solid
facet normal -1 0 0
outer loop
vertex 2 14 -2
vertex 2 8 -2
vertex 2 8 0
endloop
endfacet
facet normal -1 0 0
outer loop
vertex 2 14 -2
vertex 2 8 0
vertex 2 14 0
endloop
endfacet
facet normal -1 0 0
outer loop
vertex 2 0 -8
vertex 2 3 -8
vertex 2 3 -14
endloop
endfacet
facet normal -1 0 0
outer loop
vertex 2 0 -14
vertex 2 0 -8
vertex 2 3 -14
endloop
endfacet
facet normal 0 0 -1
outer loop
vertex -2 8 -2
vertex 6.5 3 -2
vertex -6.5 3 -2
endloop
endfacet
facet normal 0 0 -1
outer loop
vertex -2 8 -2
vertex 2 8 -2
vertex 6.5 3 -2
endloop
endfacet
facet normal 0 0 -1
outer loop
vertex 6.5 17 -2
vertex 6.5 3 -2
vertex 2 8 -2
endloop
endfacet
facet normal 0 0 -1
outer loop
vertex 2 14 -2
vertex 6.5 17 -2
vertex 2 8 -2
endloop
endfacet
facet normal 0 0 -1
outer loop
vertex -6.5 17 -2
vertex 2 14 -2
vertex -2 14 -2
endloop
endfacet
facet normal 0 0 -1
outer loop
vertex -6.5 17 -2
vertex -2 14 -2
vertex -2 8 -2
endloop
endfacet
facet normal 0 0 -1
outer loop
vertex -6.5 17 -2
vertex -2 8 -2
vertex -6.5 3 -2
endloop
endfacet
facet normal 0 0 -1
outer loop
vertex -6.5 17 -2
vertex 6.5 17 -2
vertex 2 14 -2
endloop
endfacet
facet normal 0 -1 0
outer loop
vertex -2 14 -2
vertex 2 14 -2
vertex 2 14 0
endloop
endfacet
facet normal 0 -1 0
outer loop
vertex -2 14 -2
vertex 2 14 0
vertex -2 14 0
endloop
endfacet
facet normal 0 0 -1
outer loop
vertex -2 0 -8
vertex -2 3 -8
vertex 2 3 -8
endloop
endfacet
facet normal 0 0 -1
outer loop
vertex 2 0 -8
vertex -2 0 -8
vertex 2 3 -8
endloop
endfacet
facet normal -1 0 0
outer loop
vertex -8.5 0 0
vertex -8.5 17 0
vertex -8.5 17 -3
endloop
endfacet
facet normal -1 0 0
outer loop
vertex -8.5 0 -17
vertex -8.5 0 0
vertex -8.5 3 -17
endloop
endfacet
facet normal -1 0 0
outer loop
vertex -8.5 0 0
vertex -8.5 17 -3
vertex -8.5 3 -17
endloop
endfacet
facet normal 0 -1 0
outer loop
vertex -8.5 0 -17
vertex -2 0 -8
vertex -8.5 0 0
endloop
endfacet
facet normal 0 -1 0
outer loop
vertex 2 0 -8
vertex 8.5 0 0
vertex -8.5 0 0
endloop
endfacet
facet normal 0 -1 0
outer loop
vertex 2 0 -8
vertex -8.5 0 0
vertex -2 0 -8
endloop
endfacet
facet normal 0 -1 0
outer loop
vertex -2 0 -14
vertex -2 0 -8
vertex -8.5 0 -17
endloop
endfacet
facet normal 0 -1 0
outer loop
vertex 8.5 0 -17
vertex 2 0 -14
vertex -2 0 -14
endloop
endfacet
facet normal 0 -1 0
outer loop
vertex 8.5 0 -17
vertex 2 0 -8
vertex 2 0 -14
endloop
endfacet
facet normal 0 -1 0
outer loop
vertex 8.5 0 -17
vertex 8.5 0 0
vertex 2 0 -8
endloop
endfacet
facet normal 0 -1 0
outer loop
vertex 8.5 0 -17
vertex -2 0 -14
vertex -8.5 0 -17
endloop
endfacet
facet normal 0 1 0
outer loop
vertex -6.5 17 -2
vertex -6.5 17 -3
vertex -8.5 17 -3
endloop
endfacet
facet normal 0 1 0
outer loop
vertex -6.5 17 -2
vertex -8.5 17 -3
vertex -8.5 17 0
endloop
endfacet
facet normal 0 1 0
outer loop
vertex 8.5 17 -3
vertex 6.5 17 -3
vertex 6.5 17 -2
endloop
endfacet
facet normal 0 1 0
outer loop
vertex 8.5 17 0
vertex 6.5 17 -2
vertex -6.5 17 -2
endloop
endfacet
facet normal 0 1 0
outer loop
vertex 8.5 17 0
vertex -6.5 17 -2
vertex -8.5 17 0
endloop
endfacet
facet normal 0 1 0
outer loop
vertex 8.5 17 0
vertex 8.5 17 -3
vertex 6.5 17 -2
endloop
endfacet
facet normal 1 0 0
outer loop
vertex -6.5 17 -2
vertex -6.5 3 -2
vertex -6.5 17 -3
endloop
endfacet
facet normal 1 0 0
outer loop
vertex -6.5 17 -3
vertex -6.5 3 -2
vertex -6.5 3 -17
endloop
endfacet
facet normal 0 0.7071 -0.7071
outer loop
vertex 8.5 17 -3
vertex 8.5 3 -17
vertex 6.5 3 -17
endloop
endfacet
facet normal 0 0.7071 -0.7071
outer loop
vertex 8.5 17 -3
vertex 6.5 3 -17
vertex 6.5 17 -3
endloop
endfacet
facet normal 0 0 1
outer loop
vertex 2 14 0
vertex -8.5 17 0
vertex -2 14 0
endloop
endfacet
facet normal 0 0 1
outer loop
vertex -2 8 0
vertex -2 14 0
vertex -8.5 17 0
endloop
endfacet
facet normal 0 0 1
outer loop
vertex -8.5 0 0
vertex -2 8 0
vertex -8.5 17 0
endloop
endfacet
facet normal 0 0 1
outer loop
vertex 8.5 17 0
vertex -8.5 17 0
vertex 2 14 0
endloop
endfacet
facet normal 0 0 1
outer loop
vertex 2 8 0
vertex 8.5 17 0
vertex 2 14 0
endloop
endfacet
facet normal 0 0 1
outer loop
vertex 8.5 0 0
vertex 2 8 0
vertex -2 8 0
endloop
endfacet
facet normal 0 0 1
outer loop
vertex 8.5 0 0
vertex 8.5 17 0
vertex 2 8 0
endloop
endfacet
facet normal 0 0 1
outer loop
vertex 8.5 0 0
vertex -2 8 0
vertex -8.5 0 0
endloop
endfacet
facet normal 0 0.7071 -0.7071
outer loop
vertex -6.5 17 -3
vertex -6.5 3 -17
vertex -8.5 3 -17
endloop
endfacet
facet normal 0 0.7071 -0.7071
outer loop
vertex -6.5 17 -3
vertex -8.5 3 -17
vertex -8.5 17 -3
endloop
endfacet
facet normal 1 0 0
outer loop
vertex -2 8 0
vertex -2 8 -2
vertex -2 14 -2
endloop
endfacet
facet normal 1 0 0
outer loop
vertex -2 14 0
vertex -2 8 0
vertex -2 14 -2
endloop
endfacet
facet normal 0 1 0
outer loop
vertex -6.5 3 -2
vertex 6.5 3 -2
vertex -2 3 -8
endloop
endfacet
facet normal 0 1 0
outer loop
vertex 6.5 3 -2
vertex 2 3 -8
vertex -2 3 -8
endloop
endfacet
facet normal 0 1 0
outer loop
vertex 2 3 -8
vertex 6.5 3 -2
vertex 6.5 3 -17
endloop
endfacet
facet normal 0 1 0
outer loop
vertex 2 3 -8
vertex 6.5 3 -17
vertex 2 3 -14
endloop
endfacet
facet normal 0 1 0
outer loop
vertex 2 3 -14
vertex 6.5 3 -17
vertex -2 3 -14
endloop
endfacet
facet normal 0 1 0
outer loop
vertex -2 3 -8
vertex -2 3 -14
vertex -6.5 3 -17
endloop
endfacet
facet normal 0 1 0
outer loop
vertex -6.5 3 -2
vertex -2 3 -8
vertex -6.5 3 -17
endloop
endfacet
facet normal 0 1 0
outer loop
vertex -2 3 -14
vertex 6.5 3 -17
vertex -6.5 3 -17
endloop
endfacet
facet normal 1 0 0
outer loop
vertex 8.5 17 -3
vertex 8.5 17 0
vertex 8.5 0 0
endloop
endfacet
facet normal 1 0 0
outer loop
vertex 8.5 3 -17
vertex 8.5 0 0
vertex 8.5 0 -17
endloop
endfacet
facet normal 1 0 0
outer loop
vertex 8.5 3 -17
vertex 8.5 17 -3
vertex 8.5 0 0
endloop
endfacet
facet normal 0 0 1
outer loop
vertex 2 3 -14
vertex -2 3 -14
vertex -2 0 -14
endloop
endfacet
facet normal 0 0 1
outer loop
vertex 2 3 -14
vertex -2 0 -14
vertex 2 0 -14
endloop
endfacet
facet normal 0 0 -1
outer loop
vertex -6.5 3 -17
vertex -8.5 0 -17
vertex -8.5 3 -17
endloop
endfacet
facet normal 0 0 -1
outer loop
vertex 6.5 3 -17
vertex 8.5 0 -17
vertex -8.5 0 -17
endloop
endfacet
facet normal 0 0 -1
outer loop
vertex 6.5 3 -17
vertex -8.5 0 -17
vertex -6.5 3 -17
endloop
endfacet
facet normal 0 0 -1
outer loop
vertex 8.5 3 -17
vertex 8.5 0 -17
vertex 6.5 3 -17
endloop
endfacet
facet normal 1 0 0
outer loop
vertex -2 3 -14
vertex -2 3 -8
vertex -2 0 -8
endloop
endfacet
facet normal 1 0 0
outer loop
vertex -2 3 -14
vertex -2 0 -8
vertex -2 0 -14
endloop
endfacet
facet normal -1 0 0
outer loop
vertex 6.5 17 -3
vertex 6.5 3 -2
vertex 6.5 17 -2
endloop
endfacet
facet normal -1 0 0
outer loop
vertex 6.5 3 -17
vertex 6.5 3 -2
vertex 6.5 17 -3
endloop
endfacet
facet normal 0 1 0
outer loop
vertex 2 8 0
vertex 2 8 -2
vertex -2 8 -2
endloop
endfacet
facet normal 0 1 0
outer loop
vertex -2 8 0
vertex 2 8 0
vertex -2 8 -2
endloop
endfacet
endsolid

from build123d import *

# Parameters (mm, degrees)
BODY_DEPTH     = 8.5
SKETCH2_W      = 13
SKETCH2_H      = 14
EXTUSION_DEPTH = 15
SKETCH3_W      = 4
SKETCH3_H      = 6
HOLE_A_DEPTH   = 25.212600026
SKETCH4_W      = 4
SKETCH4_H      = 6
HOLE_B_DEPTH   = 17


with BuildPart() as part:
    # Sketch1 → Body (new, symmetric)
    with BuildSketch(Plane(origin=(0, 0, 0), x_dir=(0, 0, -1), z_dir=(1, 0, 0))):
        Polygon((3, 17), (0, 17), (0, 0), (17, 0), (17, 3), align=None)
    extrude(amount=BODY_DEPTH, both=True)

    # Sketch2 → Extusion (cut)
    with BuildSketch(Plane(origin=(0, 0, -17), x_dir=(-1, 0, 0), z_dir=(0, 0, -1))):
        with Locations((0, 10)):
            Rectangle(SKETCH2_W, SKETCH2_H)
    extrude(amount=-EXTUSION_DEPTH, mode=Mode.SUBTRACT)

    # Sketch3 → Hole_A (cut, through all)
    with BuildSketch(Plane(origin=(0, 0, -2), x_dir=(-1, 0, 0), z_dir=(0, 0, -1))):
        with Locations((0, 11)):
            Rectangle(SKETCH3_W, SKETCH3_H)
    extrude(amount=-HOLE_A_DEPTH, mode=Mode.SUBTRACT)

    # Sketch4 → Hole_B (cut)
    with BuildSketch(Plane(origin=(0, 3, 0), x_dir=(1, 0, 0), z_dir=(0, 1, 0))):
        with Locations((0, 11)):
            Rectangle(SKETCH4_W, SKETCH4_H)
    extrude(amount=-HOLE_B_DEPTH, mode=Mode.SUBTRACT)


solid = part.part
